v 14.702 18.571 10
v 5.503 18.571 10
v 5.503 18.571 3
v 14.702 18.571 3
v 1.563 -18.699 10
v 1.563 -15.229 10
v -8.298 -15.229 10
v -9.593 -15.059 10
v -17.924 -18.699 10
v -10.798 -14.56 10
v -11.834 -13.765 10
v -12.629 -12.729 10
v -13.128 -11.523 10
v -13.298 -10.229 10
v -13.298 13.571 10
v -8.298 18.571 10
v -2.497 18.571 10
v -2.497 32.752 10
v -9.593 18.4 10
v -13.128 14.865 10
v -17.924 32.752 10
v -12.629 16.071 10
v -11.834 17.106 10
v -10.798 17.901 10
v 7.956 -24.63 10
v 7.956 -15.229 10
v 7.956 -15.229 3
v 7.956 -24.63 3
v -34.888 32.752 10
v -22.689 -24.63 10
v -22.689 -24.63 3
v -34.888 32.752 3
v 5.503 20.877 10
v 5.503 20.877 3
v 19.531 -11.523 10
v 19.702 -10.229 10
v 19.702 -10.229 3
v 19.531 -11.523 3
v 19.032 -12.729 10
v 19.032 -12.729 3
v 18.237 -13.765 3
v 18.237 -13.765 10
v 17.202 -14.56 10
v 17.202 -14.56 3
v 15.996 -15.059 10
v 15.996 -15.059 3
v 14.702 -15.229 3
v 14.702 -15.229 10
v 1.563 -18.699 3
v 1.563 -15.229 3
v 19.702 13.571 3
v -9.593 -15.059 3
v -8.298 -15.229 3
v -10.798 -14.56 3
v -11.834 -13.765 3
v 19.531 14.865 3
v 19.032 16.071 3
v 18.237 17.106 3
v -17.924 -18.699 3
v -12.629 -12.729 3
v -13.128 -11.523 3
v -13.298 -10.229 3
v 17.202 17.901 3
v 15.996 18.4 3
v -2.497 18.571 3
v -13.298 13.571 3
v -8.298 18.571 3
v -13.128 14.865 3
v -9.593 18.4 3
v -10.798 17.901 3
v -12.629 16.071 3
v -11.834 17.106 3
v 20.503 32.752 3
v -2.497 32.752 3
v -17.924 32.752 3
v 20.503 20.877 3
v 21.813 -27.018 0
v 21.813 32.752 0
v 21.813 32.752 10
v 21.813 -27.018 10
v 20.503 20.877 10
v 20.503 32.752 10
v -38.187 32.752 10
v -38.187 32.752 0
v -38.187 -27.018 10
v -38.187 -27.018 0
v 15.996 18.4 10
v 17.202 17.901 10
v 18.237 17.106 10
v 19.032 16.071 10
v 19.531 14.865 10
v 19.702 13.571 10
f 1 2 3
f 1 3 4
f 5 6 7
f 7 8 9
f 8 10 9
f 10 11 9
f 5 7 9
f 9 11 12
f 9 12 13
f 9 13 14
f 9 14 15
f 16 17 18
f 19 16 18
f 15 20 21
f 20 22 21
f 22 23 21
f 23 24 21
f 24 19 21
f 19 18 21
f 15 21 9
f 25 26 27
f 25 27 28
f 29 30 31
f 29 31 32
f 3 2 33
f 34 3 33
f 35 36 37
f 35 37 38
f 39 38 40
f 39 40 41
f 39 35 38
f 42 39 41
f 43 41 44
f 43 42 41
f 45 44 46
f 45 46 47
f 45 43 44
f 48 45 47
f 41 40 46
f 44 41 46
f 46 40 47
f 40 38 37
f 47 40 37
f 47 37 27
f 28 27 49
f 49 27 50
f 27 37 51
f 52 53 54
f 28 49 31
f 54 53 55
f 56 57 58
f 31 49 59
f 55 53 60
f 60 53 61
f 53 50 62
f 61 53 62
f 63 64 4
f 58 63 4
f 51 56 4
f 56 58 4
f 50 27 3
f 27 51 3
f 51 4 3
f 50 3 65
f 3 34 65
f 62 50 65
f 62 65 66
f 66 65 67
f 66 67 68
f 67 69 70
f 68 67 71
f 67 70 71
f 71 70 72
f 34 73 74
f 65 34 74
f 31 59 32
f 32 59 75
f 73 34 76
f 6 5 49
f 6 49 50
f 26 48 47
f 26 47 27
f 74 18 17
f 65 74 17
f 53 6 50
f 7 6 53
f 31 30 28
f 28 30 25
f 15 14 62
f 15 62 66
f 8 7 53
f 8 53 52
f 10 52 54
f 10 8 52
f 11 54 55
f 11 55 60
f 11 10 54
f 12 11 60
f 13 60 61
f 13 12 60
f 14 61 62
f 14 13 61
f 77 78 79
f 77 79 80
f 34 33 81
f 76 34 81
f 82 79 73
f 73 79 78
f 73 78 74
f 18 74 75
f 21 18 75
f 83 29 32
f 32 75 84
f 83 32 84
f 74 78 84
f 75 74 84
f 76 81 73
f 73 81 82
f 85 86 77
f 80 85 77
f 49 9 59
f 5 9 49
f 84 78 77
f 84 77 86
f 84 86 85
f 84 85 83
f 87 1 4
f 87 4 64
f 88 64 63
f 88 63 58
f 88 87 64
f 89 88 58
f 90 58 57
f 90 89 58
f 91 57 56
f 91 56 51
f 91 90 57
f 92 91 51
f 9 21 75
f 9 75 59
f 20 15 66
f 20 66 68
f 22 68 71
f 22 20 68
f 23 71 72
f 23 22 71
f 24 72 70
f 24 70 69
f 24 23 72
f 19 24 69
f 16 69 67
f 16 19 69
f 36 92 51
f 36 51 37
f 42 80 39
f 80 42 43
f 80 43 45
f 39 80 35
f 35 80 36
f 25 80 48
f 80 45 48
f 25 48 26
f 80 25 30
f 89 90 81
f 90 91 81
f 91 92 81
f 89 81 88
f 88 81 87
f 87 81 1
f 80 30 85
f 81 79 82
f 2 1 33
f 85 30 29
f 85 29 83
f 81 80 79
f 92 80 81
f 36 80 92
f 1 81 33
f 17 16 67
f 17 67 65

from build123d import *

# Parameters (mm, degrees)
BOSS_EXTRUDE1_DEPTH = 10
CUT_EXTRUDE1_DEPTH  = 7
SKETCH3_W           = 15
SKETCH3_H           = 11.874964638
CUT_EXTRUDE2_DEPTH  = 7
CUT_EXTRUDE3_DEPTH  = 7


with BuildPart() as part:
    # Sketch1 → Boss-Extrude1 (new body)
    with BuildSketch(Plane.XY):
        Polygon((-28.187365871, 32.751649119), (21.812634129, 32.751649119), (21.812634129, -27.017852667), (-28.187365871, -27.017852667), (-38.187365871, -27.017852667), (-38.187365871, 32.751649119), align=None)
    extrude(amount=BOSS_EXTRUDE1_DEPTH)

    # Sketch2 → Cut-Extrude1 (cut)
    with BuildSketch(Plane.XY.offset(10)):
        with BuildLine():
            Line((-8.298420819, 18.570619113), (14.701579181, 18.570619113))
            ThreePointArc((14.701579181, 18.570619113), (18.237113087, 17.106153019), (19.701579181, 13.570619113))
            Line((19.701579181, 13.570619113), (19.701579181, -10.229380887))
            ThreePointArc((19.701579181, -10.229380887), (18.237113087, -13.764914793), (14.701579181, -15.229380887))
            Line((14.701579181, -15.229380887), (-8.298420819, -15.229380887))
            ThreePointArc((-8.298420819, -15.229380887), (-11.833954725, -13.764914793), (-13.298420819, -10.229380887))
            Line((-13.298420819, -10.229380887), (-13.298420819, 13.570619113))
            ThreePointArc((-13.298420819, 13.570619113), (-11.833954725, 17.106153019), (-8.298420819, 18.570619113))
        make_face()
    extrude(amount=-CUT_EXTRUDE1_DEPTH, mode=Mode.SUBTRACT)

    # Sketch3 → Cut-Extrude2 (cut)
    with BuildSketch(Plane.XY.offset(10)):
        Polygon((5.503263718, 32.751649119), (-2.496736282, 32.751649119), (-2.496736282, 18.570619113), (5.503263718, 18.570619113), (5.503263718, 20.876684481), align=None)
        with Locations((13.003263718, 26.8141668)):
            Rectangle(SKETCH3_W, SKETCH3_H)
    extrude(amount=-CUT_EXTRUDE2_DEPTH, mode=Mode.SUBTRACT)

    # Sketch4 → Cut-Extrude3 (cut)
    with BuildSketch(Plane.XY.offset(10)):
        Polygon((1.563165921, -15.229380887), (7.956099034, -15.229380887), (7.956099034, -24.630130661), (1.563165921, -24.630130661), (-17.923726581, -24.630130661), (-22.688843527, -24.630130661), (-34.888499332, 32.751649119), (-17.923726581, 32.751649119), (-17.923726581, -18.699337291), (1.563165921, -18.699337291), align=None)
    extrude(amount=-CUT_EXTRUDE3_DEPTH, mode=Mode.SUBTRACT)


solid = part.part
